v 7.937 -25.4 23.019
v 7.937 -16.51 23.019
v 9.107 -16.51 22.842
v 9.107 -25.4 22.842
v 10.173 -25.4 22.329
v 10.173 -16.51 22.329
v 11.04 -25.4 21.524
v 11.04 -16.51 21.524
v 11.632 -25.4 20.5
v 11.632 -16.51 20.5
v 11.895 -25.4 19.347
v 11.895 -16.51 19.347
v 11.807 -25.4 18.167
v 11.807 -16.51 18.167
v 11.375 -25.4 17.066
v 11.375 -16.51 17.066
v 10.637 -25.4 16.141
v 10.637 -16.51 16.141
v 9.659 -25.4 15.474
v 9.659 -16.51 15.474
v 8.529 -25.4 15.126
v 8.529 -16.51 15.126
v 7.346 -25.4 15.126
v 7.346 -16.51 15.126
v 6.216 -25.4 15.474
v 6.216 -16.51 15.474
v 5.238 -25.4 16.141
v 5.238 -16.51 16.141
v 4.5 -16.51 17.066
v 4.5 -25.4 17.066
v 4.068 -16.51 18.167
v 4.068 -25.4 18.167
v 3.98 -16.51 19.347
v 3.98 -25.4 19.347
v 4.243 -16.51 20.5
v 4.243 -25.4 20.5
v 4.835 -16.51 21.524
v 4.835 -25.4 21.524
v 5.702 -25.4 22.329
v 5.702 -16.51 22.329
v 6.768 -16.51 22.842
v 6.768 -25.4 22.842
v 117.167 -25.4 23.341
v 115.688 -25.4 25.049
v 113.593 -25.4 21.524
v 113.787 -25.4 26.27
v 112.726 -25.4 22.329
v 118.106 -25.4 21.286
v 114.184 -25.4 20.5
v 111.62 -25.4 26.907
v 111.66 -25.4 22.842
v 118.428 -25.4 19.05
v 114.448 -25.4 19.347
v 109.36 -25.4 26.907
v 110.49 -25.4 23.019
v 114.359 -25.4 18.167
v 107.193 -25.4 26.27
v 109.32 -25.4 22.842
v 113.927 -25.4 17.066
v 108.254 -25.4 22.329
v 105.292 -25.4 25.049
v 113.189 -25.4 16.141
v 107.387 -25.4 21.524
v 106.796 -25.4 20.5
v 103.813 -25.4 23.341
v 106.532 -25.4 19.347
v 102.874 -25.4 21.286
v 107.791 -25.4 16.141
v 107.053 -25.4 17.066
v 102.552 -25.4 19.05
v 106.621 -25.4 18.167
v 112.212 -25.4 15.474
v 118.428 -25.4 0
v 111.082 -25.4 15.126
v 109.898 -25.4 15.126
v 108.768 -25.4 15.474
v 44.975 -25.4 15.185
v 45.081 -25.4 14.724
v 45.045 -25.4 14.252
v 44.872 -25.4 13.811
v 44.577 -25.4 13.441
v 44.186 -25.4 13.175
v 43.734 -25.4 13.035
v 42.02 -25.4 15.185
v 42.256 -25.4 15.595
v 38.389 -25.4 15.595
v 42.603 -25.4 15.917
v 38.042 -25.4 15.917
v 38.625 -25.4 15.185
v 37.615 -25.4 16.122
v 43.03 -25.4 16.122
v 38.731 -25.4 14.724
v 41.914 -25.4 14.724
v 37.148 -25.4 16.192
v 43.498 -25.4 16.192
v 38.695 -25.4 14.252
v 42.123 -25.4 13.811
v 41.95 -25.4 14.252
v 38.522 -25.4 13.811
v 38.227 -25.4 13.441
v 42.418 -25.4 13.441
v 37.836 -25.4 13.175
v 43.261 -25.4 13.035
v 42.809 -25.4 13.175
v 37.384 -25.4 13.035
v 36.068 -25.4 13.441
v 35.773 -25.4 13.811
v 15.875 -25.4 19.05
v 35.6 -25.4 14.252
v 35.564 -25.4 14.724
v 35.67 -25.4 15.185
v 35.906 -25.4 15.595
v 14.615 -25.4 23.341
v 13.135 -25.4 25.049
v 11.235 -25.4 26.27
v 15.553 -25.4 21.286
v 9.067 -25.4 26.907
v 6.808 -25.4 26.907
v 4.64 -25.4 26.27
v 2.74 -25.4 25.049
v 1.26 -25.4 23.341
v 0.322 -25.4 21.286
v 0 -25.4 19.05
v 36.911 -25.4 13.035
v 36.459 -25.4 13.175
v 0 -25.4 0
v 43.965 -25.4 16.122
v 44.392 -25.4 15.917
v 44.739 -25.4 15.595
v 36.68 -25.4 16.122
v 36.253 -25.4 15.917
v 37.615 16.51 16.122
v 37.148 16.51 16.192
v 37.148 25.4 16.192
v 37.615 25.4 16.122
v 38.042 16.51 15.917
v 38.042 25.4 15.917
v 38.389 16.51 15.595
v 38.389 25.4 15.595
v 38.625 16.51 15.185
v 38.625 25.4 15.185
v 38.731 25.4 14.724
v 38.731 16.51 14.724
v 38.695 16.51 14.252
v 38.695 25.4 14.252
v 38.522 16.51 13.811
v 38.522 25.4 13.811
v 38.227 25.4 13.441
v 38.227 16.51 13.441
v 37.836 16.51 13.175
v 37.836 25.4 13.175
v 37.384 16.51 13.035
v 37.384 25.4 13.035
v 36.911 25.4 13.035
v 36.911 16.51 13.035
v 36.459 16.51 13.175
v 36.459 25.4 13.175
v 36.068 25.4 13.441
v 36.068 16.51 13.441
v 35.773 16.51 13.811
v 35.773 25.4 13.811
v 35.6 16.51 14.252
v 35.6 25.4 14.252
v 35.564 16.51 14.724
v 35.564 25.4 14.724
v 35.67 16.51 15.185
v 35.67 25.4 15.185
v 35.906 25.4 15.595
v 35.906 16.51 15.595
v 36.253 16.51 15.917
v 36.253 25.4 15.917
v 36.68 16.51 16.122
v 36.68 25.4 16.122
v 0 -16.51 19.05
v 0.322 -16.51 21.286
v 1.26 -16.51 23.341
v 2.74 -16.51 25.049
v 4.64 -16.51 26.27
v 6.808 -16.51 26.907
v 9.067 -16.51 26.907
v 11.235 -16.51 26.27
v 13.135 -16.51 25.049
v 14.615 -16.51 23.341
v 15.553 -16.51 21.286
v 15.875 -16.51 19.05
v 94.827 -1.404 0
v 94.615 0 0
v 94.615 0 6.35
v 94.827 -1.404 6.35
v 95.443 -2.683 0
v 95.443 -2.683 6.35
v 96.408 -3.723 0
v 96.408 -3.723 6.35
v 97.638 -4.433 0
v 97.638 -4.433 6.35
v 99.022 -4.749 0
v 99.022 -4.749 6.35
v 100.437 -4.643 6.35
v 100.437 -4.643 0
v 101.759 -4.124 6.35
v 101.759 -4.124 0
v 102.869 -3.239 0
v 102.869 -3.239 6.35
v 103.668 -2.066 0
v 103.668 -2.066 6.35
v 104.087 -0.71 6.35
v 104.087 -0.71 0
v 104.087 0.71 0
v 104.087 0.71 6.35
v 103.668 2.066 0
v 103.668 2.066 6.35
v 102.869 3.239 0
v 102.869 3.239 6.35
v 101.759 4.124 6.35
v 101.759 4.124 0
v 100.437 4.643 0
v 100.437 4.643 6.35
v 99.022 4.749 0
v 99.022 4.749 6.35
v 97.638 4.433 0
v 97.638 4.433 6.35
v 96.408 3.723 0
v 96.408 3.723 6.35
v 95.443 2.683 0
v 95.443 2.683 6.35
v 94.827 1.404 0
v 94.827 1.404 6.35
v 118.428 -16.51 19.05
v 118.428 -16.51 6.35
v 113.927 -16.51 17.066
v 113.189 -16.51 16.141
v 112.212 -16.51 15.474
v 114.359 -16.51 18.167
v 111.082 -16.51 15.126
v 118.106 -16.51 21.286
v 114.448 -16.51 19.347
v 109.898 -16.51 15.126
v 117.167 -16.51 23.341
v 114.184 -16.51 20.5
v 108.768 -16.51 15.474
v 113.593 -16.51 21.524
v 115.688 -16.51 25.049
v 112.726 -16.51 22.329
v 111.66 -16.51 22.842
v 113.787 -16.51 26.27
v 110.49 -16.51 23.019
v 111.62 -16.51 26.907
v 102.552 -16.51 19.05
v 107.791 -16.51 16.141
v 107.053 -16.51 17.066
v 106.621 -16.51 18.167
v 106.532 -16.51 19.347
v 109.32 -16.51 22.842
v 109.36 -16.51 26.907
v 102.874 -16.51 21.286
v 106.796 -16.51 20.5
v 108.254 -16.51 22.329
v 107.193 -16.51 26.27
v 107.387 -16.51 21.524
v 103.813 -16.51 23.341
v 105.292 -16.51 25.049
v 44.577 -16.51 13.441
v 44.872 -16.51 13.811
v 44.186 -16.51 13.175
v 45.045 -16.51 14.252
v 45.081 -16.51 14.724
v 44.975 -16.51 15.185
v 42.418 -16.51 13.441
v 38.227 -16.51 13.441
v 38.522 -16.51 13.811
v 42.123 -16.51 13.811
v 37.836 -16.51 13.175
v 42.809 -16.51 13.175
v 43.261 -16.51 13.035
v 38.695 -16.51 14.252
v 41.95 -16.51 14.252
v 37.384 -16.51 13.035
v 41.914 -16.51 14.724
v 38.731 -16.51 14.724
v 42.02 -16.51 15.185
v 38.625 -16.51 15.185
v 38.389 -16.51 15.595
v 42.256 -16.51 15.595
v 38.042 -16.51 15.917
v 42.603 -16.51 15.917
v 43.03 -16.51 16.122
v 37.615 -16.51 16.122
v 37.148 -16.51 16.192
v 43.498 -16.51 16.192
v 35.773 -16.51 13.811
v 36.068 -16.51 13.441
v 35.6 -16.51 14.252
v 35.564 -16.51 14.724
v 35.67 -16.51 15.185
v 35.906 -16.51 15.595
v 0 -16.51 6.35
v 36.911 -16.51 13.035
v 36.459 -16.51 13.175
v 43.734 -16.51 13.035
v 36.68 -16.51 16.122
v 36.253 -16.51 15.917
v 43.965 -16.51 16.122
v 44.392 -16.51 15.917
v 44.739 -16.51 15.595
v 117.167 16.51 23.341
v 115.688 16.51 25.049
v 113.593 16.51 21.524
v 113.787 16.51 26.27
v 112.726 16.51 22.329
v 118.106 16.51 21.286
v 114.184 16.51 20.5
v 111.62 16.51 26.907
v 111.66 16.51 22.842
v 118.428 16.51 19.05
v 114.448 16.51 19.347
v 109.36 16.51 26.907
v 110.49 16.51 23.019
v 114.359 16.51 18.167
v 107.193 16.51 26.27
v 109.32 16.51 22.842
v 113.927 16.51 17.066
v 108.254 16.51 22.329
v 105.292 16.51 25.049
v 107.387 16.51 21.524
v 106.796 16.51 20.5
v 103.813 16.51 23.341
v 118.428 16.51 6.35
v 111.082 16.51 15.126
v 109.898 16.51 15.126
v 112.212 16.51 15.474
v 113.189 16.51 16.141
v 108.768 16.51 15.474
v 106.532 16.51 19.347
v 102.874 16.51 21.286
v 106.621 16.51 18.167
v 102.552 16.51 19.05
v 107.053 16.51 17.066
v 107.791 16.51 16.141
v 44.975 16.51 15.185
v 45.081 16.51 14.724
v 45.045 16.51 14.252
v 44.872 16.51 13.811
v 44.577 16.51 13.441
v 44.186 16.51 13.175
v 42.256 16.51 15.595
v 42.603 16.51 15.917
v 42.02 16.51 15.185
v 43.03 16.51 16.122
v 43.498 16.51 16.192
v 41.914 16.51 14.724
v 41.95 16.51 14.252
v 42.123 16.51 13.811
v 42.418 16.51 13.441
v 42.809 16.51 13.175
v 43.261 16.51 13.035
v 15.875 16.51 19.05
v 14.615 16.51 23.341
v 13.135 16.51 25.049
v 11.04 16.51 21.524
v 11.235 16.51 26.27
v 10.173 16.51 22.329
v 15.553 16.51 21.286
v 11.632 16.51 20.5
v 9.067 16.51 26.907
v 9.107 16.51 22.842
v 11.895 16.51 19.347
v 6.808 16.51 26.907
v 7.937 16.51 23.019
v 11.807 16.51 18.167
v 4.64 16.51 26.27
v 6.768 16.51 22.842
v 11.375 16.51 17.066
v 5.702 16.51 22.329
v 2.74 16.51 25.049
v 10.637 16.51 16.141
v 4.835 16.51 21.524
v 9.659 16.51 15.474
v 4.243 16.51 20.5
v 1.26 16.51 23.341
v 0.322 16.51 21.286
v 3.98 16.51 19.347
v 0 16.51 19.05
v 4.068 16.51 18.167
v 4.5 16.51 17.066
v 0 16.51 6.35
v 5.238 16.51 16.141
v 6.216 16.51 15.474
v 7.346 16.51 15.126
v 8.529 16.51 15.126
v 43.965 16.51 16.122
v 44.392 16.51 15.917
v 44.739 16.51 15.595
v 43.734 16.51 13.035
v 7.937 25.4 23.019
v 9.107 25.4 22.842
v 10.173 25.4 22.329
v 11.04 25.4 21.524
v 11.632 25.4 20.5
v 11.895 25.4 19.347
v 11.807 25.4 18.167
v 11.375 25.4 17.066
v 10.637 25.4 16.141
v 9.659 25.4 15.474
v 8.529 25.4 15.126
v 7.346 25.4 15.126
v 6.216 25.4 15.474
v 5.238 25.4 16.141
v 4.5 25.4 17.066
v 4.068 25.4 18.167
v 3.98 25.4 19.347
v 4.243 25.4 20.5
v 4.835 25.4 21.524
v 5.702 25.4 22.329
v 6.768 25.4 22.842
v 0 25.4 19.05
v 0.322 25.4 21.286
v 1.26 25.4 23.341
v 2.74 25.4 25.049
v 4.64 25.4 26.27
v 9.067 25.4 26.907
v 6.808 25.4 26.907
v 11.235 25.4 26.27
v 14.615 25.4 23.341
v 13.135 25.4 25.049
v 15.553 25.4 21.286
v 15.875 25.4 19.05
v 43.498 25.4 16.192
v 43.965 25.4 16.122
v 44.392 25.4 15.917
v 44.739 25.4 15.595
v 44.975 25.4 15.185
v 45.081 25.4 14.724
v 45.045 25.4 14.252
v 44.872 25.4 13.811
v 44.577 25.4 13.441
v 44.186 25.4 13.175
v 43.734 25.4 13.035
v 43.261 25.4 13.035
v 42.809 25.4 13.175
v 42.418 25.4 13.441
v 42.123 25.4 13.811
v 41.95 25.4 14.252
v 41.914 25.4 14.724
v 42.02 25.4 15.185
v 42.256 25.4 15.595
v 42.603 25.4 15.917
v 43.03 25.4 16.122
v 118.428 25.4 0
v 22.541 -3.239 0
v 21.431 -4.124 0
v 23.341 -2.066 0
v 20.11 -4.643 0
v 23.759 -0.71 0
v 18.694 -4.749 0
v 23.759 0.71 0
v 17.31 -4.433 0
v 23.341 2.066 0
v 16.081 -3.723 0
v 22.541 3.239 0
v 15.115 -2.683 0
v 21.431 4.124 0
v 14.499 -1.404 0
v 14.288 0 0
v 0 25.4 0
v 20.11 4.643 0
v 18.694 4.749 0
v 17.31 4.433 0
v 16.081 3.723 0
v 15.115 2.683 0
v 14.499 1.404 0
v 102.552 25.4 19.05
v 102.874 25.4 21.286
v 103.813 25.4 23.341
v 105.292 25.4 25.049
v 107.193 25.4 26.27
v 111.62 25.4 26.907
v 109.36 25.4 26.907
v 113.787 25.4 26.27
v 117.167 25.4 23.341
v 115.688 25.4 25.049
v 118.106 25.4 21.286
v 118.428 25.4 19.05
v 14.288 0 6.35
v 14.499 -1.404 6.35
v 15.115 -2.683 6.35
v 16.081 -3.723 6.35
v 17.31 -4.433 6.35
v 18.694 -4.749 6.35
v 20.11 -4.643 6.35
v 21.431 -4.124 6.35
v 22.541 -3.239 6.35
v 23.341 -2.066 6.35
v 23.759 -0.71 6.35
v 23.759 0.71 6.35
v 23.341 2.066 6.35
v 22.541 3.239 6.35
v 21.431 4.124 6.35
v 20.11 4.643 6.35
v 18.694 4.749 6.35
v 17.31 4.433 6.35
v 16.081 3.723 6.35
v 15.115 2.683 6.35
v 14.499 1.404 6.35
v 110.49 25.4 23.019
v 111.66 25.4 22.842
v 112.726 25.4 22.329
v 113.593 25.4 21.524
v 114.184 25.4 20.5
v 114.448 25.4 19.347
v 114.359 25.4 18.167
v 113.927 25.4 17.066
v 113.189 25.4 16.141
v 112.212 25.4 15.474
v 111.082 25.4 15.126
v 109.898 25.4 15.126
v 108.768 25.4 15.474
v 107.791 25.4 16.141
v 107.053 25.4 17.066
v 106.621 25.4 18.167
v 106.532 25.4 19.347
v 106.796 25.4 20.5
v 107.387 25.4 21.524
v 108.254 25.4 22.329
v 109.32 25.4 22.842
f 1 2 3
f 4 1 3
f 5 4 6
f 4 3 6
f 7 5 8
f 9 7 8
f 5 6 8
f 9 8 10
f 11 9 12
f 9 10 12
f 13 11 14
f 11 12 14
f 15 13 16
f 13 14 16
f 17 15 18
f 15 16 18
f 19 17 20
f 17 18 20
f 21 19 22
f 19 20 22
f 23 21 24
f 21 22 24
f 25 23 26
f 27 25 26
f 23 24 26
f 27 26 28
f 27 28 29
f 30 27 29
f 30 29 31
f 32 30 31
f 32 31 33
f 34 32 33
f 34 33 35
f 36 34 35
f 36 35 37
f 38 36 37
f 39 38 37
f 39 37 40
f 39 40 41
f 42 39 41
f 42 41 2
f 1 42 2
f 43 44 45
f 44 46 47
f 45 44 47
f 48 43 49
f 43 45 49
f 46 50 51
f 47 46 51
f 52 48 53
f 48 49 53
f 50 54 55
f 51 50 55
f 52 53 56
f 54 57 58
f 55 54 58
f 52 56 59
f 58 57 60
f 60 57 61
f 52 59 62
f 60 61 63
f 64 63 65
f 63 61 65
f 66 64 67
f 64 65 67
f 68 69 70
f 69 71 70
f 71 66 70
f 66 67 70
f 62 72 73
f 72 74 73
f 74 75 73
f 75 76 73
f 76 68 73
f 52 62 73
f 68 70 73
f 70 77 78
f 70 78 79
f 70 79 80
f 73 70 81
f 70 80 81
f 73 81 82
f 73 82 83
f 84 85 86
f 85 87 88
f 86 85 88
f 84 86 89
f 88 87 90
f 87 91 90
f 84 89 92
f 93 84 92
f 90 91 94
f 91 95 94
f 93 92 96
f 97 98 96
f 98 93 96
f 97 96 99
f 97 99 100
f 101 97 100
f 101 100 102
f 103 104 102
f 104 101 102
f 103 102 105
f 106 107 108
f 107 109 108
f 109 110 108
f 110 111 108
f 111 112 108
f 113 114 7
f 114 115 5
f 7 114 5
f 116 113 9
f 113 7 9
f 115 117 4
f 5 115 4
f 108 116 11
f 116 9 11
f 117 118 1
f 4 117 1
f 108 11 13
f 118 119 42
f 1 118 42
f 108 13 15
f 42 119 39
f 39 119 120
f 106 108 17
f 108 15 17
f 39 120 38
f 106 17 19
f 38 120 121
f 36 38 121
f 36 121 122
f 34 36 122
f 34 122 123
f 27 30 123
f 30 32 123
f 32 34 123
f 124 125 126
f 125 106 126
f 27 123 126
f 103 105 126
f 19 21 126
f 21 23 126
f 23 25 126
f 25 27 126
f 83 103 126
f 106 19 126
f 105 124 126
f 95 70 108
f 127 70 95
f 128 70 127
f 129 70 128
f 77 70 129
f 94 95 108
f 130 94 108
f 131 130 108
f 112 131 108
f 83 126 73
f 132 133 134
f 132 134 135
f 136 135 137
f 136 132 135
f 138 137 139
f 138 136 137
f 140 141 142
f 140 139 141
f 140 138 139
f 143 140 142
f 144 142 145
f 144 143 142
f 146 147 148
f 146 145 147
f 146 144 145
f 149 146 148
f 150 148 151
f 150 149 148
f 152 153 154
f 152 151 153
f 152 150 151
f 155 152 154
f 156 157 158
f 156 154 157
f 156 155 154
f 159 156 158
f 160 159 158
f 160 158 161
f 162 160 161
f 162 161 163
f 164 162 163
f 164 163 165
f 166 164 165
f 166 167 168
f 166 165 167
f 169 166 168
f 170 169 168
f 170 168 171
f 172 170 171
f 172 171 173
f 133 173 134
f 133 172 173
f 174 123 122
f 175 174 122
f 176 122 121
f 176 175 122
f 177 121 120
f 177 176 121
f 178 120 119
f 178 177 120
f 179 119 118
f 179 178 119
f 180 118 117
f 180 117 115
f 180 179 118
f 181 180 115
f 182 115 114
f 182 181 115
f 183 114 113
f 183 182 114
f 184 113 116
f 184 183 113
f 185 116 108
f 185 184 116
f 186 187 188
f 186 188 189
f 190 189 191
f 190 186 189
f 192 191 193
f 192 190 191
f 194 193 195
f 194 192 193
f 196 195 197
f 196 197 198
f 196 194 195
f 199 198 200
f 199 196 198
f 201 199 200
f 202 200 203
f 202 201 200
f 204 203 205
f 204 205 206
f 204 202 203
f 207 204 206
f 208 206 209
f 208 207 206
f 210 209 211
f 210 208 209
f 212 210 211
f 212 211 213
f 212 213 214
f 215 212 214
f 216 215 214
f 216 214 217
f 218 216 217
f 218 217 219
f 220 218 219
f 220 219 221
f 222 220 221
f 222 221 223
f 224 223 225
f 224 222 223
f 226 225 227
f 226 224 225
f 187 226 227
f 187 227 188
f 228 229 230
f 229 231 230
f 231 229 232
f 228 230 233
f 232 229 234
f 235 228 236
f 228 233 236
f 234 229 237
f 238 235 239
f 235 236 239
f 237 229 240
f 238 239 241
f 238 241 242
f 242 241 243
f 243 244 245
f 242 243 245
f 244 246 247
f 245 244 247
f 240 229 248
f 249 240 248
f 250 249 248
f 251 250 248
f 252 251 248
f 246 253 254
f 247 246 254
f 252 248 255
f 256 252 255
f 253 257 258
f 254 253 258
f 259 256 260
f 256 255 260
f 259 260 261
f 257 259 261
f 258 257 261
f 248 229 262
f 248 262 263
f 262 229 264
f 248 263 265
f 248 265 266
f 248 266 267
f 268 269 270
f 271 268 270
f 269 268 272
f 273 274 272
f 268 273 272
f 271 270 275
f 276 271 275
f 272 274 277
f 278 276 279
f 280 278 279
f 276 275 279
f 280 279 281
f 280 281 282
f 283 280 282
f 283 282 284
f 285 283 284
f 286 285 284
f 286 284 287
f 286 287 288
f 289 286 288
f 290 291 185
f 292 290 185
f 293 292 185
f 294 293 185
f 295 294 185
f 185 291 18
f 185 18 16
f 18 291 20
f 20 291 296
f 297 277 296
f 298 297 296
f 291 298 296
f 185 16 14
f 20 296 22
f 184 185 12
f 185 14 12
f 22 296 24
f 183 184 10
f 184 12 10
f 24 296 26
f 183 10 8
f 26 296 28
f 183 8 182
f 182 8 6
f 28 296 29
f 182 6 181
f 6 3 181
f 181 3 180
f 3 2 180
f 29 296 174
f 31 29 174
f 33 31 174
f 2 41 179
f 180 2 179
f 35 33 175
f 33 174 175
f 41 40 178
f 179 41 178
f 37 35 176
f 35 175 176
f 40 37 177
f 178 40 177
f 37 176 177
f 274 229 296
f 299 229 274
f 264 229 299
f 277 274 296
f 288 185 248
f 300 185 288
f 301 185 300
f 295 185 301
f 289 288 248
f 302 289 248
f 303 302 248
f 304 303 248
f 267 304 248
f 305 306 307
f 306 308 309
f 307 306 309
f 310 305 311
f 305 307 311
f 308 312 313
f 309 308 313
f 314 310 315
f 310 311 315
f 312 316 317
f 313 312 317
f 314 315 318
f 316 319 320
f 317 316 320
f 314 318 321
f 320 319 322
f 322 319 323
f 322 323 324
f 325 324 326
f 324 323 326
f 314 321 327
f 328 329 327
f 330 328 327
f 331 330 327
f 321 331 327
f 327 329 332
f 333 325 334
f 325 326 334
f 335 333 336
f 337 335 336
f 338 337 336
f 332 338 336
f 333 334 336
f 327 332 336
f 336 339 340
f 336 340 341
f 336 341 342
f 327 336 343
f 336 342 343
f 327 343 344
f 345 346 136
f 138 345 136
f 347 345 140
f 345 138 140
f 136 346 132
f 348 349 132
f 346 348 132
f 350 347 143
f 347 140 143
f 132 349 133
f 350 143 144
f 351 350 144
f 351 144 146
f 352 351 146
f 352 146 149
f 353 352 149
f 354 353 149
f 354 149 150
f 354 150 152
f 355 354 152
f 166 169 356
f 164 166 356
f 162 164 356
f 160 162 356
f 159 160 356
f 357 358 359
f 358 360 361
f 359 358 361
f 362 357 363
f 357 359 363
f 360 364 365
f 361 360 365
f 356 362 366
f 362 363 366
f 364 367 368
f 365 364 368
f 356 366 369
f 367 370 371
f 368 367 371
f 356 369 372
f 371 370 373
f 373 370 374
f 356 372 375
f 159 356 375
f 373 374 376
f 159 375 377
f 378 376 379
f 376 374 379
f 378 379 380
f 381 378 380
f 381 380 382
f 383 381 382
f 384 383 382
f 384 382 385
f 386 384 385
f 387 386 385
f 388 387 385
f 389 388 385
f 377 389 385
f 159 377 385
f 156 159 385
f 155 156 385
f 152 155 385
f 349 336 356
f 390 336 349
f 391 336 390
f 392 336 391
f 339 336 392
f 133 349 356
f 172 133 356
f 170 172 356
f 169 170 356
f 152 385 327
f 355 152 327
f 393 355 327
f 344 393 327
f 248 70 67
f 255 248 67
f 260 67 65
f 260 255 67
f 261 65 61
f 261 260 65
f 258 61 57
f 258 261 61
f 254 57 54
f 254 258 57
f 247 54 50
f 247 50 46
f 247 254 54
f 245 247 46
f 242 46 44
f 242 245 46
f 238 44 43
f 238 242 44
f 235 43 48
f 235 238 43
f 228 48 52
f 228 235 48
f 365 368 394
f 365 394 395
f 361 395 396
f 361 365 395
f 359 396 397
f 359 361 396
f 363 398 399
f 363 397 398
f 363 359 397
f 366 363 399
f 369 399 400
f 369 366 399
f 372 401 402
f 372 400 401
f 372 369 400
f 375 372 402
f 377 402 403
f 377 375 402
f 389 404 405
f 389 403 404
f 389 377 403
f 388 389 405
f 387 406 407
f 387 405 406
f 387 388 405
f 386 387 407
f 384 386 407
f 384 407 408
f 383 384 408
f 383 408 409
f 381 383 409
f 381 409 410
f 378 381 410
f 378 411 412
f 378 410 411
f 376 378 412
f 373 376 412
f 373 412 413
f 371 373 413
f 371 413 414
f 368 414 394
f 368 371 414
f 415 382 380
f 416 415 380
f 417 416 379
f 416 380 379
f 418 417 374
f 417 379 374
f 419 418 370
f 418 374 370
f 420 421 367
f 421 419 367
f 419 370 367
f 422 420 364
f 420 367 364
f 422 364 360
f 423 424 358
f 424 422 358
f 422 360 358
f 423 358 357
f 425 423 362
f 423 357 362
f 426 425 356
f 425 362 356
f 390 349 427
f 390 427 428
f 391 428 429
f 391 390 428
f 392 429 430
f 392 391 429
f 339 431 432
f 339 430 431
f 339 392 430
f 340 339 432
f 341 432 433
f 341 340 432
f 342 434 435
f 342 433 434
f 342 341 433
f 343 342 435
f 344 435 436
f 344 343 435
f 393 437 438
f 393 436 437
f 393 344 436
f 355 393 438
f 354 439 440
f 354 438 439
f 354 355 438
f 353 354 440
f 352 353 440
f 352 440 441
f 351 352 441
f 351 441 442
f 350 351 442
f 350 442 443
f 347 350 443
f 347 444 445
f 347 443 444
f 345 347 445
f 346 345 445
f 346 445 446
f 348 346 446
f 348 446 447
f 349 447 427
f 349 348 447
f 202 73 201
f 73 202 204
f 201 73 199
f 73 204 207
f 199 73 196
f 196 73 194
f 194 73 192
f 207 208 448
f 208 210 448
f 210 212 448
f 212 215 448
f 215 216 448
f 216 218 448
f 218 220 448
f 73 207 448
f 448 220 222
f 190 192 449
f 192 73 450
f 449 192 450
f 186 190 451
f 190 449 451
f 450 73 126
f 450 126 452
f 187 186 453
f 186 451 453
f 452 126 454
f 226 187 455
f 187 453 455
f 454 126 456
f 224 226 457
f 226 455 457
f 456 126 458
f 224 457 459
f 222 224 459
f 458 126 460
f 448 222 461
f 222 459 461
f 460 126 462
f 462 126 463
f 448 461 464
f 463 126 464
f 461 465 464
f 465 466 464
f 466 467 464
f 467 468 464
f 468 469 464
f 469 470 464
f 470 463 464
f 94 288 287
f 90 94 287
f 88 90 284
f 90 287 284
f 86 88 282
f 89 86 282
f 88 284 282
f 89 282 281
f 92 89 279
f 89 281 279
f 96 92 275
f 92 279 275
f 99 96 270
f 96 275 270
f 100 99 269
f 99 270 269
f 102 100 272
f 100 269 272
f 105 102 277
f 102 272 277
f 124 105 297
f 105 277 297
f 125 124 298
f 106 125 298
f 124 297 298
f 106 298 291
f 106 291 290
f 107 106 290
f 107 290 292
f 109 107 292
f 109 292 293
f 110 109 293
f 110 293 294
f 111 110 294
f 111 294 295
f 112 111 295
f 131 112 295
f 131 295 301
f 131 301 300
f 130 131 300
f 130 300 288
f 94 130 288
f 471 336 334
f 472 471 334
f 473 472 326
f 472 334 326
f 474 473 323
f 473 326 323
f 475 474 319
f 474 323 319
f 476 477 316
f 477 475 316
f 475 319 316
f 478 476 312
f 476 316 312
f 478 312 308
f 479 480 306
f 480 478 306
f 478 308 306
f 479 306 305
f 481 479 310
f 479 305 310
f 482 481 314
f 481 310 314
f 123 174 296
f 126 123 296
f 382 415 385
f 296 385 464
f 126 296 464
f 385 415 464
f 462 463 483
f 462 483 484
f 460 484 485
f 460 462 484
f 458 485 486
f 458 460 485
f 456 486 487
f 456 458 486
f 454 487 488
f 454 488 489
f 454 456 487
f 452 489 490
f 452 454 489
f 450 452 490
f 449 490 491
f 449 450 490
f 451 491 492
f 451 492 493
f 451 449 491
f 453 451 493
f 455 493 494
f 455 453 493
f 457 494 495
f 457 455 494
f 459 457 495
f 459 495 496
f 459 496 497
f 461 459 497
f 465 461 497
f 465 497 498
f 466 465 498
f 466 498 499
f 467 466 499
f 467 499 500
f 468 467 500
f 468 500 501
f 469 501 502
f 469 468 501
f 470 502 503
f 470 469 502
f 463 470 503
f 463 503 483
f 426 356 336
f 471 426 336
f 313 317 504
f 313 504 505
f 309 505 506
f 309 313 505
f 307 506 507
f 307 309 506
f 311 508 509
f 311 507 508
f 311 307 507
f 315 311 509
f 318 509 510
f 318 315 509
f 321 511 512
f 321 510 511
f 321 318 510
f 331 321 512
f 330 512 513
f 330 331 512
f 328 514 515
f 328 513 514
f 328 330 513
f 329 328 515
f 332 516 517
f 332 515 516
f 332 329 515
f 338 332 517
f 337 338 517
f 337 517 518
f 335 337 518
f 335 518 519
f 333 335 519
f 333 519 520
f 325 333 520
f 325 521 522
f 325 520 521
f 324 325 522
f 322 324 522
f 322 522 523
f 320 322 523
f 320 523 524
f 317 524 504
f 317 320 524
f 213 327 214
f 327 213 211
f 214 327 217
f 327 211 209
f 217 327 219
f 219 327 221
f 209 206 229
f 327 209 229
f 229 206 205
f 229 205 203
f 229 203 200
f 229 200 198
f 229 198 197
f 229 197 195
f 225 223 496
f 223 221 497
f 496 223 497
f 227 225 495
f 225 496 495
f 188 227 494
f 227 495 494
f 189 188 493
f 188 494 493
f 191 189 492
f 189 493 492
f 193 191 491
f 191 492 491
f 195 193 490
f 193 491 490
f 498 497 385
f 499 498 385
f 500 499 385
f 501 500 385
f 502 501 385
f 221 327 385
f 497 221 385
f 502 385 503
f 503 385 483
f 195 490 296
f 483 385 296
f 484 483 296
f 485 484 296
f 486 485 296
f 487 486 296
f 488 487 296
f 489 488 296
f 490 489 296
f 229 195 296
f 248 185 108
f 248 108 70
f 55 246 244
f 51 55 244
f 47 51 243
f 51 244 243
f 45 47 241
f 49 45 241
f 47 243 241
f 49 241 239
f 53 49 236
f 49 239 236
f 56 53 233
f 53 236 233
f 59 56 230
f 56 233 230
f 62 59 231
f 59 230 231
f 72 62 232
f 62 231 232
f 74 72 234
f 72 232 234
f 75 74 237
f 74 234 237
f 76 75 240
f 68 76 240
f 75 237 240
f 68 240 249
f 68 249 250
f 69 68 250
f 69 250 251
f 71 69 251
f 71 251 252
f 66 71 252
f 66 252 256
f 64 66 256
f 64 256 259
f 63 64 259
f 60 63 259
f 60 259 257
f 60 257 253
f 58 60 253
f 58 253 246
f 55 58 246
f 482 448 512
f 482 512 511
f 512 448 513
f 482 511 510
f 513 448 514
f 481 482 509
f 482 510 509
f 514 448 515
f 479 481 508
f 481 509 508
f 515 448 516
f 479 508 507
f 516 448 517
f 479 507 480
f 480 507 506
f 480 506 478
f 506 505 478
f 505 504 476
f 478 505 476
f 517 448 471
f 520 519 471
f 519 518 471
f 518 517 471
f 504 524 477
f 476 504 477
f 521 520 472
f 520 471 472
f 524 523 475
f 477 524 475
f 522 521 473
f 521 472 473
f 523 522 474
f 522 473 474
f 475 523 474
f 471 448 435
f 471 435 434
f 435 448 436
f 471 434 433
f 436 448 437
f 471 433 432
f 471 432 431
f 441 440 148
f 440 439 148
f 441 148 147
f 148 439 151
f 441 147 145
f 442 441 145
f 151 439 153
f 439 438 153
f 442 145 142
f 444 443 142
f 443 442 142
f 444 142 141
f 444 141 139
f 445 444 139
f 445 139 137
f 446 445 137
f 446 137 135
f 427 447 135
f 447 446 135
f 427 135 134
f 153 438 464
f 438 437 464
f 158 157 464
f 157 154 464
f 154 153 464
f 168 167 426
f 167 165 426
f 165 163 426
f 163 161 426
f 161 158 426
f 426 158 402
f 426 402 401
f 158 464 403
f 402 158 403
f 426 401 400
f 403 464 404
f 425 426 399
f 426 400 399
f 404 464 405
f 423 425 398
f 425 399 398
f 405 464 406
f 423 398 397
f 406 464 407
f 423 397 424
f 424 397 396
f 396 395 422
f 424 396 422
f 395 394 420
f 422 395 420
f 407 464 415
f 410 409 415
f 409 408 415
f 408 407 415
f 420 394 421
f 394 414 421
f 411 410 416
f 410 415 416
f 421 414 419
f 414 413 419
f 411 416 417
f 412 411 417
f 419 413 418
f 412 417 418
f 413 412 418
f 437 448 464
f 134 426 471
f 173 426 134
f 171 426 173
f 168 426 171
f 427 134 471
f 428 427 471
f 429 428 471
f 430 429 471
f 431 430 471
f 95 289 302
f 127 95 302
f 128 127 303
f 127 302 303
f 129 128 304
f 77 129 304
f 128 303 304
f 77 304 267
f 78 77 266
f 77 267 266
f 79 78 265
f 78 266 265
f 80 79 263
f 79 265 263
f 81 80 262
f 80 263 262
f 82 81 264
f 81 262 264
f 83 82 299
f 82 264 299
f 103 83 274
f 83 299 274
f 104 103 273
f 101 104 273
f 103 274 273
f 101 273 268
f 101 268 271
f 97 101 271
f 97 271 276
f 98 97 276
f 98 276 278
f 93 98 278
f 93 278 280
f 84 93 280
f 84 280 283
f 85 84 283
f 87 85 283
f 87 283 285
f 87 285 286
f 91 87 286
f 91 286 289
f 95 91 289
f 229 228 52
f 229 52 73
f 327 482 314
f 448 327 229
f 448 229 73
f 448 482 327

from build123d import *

# Parameters (mm, degrees)
BOSS_EXTRUDE1_DEPTH            = 118.4275
CUT_EXTRUDE1_REACH             = 138.757
SKETCH3_R                      = 3.96875
SKETCH3_R_2                    = 1.5875
CUT_EXTRUDE1_DIRECTION_2_REACH = 138.757
SKETCH4_R                      = 4.7625
CUT_EXTRUDE2_DEPTH             = 6.35


with BuildPart() as part:
    # Sketch2 → Boss-Extrude1 (new body)
    with BuildSketch(Plane(origin=(0, 0, 0), x_dir=(0, 0, -1), z_dir=(1, 0, 0))):
        Polygon((0, -25.4), (0, 25.4), (-63.5, 25.4), (-63.5, 16.51), (-6.35, 16.51), (-6.35, -16.51), (-63.5, -16.51), (-63.5, -25.4), align=None)
    extrude(amount=BOSS_EXTRUDE1_DEPTH)

    # Cut-Extrude1: up to this face of the body (flat: up to its plane)
    cut_extrude1_end = Plane(part.part.faces().sort_by_distance((59.21375, -25.4, 31.75))[0])
    # Sketch3 → Cut-Extrude1 (cut, up to the picked face)
    with BuildSketch(Plane(origin=(0, 0, 0), x_dir=(1, 0, 0), z_dir=(0, 1, 0)), mode=Mode.PRIVATE) as cut_extrude1_sk1:
        with Locations(Location((7.9375, -19.05, 0), (0, 0, 270))):
            Circle(SKETCH3_R)
    cut_extrude1_tool1 = split(extrude(cut_extrude1_sk1.sketch, amount=-CUT_EXTRUDE1_REACH, mode=Mode.PRIVATE), bisect_by=cut_extrude1_end, keep=Keep.BOTH, mode=Mode.PRIVATE)
    # Sketch3 → Cut-Extrude1 (cut, up to the picked face)
    with BuildSketch(Plane(origin=(0, 0, 0), x_dir=(1, 0, 0), z_dir=(0, 1, 0)), mode=Mode.PRIVATE) as cut_extrude1_sk2:
        with Locations(Location((110.49, -19.05, 0), (0, 0, 270))):
            Circle(SKETCH3_R)
    cut_extrude1_tool2 = split(extrude(cut_extrude1_sk2.sketch, amount=-CUT_EXTRUDE1_REACH, mode=Mode.PRIVATE), bisect_by=cut_extrude1_end, keep=Keep.BOTH, mode=Mode.PRIVATE)
    # Sketch3 → Cut-Extrude1 (cut, up to the picked face)
    with BuildSketch(Plane(origin=(0, 0, 0), x_dir=(1, 0, 0), z_dir=(0, 1, 0)), mode=Mode.PRIVATE) as cut_extrude1_sk3:
        with Locations(Location((37.1475, -14.605, 0), (0, 0, 270))):
            Circle(SKETCH3_R_2)
    cut_extrude1_tool3 = split(extrude(cut_extrude1_sk3.sketch, amount=-CUT_EXTRUDE1_REACH, mode=Mode.PRIVATE), bisect_by=cut_extrude1_end, keep=Keep.BOTH, mode=Mode.PRIVATE)
    # Sketch3 → Cut-Extrude1 (cut, up to the picked face)
    with BuildSketch(Plane(origin=(0, 0, 0), x_dir=(1, 0, 0), z_dir=(0, 1, 0)), mode=Mode.PRIVATE) as cut_extrude1_sk4:
        with Locations(Location((43.4975, -14.605, 0), (0, 0, 270))):
            Circle(SKETCH3_R_2)
    cut_extrude1_tool4 = split(extrude(cut_extrude1_sk4.sketch, amount=-CUT_EXTRUDE1_REACH, mode=Mode.PRIVATE), bisect_by=cut_extrude1_end, keep=Keep.BOTH, mode=Mode.PRIVATE)
    # Sketch3 → Cut-Extrude1 (cut, up to the picked face)
    with BuildSketch(Plane(origin=(0, 0, 0), x_dir=(1, 0, 0), z_dir=(0, 1, 0)), mode=Mode.PRIVATE) as cut_extrude1_sk5:
        with BuildLine():
            Line((15.875, -19.05), (102.5525, -19.05))
            ThreePointArc((102.5525, -19.05), (110.49, -26.9875), (118.4275, -19.05))
            Line((118.4275, -19.05), (118.4275, -63.5))
            Line((118.4275, -63.5), (0, -63.5))
            Line((0, -63.5), (0, -19.05))
            ThreePointArc((0, -19.05), (7.9375, -26.9875), (15.875, -19.05))
        make_face()
    cut_extrude1_tool5 = split(extrude(cut_extrude1_sk5.sketch, amount=-CUT_EXTRUDE1_REACH, mode=Mode.PRIVATE), bisect_by=cut_extrude1_end, keep=Keep.BOTH, mode=Mode.PRIVATE)
    add(cut_extrude1_tool1.solids().sort_by(Axis((7.9375, 0, 19.05), (0, -1, 0)))[0], mode=Mode.SUBTRACT)
    add(cut_extrude1_tool2.solids().sort_by(Axis((110.49, 0, 19.05), (0, -1, 0)))[0], mode=Mode.SUBTRACT)
    add(cut_extrude1_tool3.solids().sort_by(Axis((37.1475, 0, 14.605), (0, -1, 0)))[0], mode=Mode.SUBTRACT)
    add(cut_extrude1_tool4.solids().sort_by(Axis((43.4975, 0, 14.605), (0, -1, 0)))[0], mode=Mode.SUBTRACT)
    add(cut_extrude1_tool5.solids().sort_by(Axis((59.21375, 0, 42.011703), (0, -1, 0)))[0], mode=Mode.SUBTRACT)

    # Cut-Extrude1 direction 2: up to this face of the body (flat: up to its plane)
    cut_extrude1_direction_2_end = Plane(part.part.faces().sort_by_distance((59.21375, 25.4, 31.75))[0])
    # Sketch3 → Cut-Extrude1 direction 2 (cut, up to the picked face)
    with BuildSketch(Plane(origin=(0, 0, 0), x_dir=(1, 0, 0), z_dir=(0, 1, 0)), mode=Mode.PRIVATE) as cut_extrude1_direction_2_sk1:
        with Locations(Location((7.9375, -19.05, 0), (0, 0, 270))):
            Circle(SKETCH3_R)
    cut_extrude1_direction_2_tool1 = split(extrude(cut_extrude1_direction_2_sk1.sketch, amount=CUT_EXTRUDE1_DIRECTION_2_REACH, mode=Mode.PRIVATE), bisect_by=cut_extrude1_direction_2_end, keep=Keep.BOTH, mode=Mode.PRIVATE)
    # Sketch3 → Cut-Extrude1 direction 2 (cut, up to the picked face)
    with BuildSketch(Plane(origin=(0, 0, 0), x_dir=(1, 0, 0), z_dir=(0, 1, 0)), mode=Mode.PRIVATE) as cut_extrude1_direction_2_sk2:
        with Locations(Location((110.49, -19.05, 0), (0, 0, 270))):
            Circle(SKETCH3_R)
    cut_extrude1_direction_2_tool2 = split(extrude(cut_extrude1_direction_2_sk2.sketch, amount=CUT_EXTRUDE1_DIRECTION_2_REACH, mode=Mode.PRIVATE), bisect_by=cut_extrude1_direction_2_end, keep=Keep.BOTH, mode=Mode.PRIVATE)
    # Sketch3 → Cut-Extrude1 direction 2 (cut, up to the picked face)
    with BuildSketch(Plane(origin=(0, 0, 0), x_dir=(1, 0, 0), z_dir=(0, 1, 0)), mode=Mode.PRIVATE) as cut_extrude1_direction_2_sk3:
        with Locations(Location((37.1475, -14.605, 0), (0, 0, 270))):
            Circle(SKETCH3_R_2)
    cut_extrude1_direction_2_tool3 = split(extrude(cut_extrude1_direction_2_sk3.sketch, amount=CUT_EXTRUDE1_DIRECTION_2_REACH, mode=Mode.PRIVATE), bisect_by=cut_extrude1_direction_2_end, keep=Keep.BOTH, mode=Mode.PRIVATE)
    # Sketch3 → Cut-Extrude1 direction 2 (cut, up to the picked face)
    with BuildSketch(Plane(origin=(0, 0, 0), x_dir=(1, 0, 0), z_dir=(0, 1, 0)), mode=Mode.PRIVATE) as cut_extrude1_direction_2_sk4:
        with Locations(Location((43.4975, -14.605, 0), (0, 0, 270))):
            Circle(SKETCH3_R_2)
    cut_extrude1_direction_2_tool4 = split(extrude(cut_extrude1_direction_2_sk4.sketch, amount=CUT_EXTRUDE1_DIRECTION_2_REACH, mode=Mode.PRIVATE), bisect_by=cut_extrude1_direction_2_end, keep=Keep.BOTH, mode=Mode.PRIVATE)
    # Sketch3 → Cut-Extrude1 direction 2 (cut, up to the picked face)
    with BuildSketch(Plane(origin=(0, 0, 0), x_dir=(1, 0, 0), z_dir=(0, 1, 0)), mode=Mode.PRIVATE) as cut_extrude1_direction_2_sk5:
        with BuildLine():
            Line((15.875, -19.05), (102.5525, -19.05))
            ThreePointArc((102.5525, -19.05), (110.49, -26.9875), (118.4275, -19.05))
            Line((118.4275, -19.05), (118.4275, -63.5))
            Line((118.4275, -63.5), (0, -63.5))
            Line((0, -63.5), (0, -19.05))
            ThreePointArc((0, -19.05), (7.9375, -26.9875), (15.875, -19.05))
        make_face()
    cut_extrude1_direction_2_tool5 = split(extrude(cut_extrude1_direction_2_sk5.sketch, amount=CUT_EXTRUDE1_DIRECTION_2_REACH, mode=Mode.PRIVATE), bisect_by=cut_extrude1_direction_2_end, keep=Keep.BOTH, mode=Mode.PRIVATE)
    add(cut_extrude1_direction_2_tool1.solids().sort_by(Axis((7.9375, 0, 19.05), (0, 1, 0)))[0], mode=Mode.SUBTRACT)
    add(cut_extrude1_direction_2_tool2.solids().sort_by(Axis((110.49, 0, 19.05), (0, 1, 0)))[0], mode=Mode.SUBTRACT)
    add(cut_extrude1_direction_2_tool3.solids().sort_by(Axis((37.1475, 0, 14.605), (0, 1, 0)))[0], mode=Mode.SUBTRACT)
    add(cut_extrude1_direction_2_tool4.solids().sort_by(Axis((43.4975, 0, 14.605), (0, 1, 0)))[0], mode=Mode.SUBTRACT)
    add(cut_extrude1_direction_2_tool5.solids().sort_by(Axis((59.21375, 0, 42.011703), (0, 1, 0)))[0], mode=Mode.SUBTRACT)

    # Sketch4 → Cut-Extrude2 (cut)
    with BuildSketch(Plane.XY):
        with Locations(Location((19.05, 0, 0), (0, 0, 180))):
            Circle(SKETCH4_R)
        with Locations(Location((99.3775, 0, 0), (0, 0, 180))):
            Circle(SKETCH4_R)
    extrude(amount=CUT_EXTRUDE2_DEPTH, mode=Mode.SUBTRACT)


solid = part.part
